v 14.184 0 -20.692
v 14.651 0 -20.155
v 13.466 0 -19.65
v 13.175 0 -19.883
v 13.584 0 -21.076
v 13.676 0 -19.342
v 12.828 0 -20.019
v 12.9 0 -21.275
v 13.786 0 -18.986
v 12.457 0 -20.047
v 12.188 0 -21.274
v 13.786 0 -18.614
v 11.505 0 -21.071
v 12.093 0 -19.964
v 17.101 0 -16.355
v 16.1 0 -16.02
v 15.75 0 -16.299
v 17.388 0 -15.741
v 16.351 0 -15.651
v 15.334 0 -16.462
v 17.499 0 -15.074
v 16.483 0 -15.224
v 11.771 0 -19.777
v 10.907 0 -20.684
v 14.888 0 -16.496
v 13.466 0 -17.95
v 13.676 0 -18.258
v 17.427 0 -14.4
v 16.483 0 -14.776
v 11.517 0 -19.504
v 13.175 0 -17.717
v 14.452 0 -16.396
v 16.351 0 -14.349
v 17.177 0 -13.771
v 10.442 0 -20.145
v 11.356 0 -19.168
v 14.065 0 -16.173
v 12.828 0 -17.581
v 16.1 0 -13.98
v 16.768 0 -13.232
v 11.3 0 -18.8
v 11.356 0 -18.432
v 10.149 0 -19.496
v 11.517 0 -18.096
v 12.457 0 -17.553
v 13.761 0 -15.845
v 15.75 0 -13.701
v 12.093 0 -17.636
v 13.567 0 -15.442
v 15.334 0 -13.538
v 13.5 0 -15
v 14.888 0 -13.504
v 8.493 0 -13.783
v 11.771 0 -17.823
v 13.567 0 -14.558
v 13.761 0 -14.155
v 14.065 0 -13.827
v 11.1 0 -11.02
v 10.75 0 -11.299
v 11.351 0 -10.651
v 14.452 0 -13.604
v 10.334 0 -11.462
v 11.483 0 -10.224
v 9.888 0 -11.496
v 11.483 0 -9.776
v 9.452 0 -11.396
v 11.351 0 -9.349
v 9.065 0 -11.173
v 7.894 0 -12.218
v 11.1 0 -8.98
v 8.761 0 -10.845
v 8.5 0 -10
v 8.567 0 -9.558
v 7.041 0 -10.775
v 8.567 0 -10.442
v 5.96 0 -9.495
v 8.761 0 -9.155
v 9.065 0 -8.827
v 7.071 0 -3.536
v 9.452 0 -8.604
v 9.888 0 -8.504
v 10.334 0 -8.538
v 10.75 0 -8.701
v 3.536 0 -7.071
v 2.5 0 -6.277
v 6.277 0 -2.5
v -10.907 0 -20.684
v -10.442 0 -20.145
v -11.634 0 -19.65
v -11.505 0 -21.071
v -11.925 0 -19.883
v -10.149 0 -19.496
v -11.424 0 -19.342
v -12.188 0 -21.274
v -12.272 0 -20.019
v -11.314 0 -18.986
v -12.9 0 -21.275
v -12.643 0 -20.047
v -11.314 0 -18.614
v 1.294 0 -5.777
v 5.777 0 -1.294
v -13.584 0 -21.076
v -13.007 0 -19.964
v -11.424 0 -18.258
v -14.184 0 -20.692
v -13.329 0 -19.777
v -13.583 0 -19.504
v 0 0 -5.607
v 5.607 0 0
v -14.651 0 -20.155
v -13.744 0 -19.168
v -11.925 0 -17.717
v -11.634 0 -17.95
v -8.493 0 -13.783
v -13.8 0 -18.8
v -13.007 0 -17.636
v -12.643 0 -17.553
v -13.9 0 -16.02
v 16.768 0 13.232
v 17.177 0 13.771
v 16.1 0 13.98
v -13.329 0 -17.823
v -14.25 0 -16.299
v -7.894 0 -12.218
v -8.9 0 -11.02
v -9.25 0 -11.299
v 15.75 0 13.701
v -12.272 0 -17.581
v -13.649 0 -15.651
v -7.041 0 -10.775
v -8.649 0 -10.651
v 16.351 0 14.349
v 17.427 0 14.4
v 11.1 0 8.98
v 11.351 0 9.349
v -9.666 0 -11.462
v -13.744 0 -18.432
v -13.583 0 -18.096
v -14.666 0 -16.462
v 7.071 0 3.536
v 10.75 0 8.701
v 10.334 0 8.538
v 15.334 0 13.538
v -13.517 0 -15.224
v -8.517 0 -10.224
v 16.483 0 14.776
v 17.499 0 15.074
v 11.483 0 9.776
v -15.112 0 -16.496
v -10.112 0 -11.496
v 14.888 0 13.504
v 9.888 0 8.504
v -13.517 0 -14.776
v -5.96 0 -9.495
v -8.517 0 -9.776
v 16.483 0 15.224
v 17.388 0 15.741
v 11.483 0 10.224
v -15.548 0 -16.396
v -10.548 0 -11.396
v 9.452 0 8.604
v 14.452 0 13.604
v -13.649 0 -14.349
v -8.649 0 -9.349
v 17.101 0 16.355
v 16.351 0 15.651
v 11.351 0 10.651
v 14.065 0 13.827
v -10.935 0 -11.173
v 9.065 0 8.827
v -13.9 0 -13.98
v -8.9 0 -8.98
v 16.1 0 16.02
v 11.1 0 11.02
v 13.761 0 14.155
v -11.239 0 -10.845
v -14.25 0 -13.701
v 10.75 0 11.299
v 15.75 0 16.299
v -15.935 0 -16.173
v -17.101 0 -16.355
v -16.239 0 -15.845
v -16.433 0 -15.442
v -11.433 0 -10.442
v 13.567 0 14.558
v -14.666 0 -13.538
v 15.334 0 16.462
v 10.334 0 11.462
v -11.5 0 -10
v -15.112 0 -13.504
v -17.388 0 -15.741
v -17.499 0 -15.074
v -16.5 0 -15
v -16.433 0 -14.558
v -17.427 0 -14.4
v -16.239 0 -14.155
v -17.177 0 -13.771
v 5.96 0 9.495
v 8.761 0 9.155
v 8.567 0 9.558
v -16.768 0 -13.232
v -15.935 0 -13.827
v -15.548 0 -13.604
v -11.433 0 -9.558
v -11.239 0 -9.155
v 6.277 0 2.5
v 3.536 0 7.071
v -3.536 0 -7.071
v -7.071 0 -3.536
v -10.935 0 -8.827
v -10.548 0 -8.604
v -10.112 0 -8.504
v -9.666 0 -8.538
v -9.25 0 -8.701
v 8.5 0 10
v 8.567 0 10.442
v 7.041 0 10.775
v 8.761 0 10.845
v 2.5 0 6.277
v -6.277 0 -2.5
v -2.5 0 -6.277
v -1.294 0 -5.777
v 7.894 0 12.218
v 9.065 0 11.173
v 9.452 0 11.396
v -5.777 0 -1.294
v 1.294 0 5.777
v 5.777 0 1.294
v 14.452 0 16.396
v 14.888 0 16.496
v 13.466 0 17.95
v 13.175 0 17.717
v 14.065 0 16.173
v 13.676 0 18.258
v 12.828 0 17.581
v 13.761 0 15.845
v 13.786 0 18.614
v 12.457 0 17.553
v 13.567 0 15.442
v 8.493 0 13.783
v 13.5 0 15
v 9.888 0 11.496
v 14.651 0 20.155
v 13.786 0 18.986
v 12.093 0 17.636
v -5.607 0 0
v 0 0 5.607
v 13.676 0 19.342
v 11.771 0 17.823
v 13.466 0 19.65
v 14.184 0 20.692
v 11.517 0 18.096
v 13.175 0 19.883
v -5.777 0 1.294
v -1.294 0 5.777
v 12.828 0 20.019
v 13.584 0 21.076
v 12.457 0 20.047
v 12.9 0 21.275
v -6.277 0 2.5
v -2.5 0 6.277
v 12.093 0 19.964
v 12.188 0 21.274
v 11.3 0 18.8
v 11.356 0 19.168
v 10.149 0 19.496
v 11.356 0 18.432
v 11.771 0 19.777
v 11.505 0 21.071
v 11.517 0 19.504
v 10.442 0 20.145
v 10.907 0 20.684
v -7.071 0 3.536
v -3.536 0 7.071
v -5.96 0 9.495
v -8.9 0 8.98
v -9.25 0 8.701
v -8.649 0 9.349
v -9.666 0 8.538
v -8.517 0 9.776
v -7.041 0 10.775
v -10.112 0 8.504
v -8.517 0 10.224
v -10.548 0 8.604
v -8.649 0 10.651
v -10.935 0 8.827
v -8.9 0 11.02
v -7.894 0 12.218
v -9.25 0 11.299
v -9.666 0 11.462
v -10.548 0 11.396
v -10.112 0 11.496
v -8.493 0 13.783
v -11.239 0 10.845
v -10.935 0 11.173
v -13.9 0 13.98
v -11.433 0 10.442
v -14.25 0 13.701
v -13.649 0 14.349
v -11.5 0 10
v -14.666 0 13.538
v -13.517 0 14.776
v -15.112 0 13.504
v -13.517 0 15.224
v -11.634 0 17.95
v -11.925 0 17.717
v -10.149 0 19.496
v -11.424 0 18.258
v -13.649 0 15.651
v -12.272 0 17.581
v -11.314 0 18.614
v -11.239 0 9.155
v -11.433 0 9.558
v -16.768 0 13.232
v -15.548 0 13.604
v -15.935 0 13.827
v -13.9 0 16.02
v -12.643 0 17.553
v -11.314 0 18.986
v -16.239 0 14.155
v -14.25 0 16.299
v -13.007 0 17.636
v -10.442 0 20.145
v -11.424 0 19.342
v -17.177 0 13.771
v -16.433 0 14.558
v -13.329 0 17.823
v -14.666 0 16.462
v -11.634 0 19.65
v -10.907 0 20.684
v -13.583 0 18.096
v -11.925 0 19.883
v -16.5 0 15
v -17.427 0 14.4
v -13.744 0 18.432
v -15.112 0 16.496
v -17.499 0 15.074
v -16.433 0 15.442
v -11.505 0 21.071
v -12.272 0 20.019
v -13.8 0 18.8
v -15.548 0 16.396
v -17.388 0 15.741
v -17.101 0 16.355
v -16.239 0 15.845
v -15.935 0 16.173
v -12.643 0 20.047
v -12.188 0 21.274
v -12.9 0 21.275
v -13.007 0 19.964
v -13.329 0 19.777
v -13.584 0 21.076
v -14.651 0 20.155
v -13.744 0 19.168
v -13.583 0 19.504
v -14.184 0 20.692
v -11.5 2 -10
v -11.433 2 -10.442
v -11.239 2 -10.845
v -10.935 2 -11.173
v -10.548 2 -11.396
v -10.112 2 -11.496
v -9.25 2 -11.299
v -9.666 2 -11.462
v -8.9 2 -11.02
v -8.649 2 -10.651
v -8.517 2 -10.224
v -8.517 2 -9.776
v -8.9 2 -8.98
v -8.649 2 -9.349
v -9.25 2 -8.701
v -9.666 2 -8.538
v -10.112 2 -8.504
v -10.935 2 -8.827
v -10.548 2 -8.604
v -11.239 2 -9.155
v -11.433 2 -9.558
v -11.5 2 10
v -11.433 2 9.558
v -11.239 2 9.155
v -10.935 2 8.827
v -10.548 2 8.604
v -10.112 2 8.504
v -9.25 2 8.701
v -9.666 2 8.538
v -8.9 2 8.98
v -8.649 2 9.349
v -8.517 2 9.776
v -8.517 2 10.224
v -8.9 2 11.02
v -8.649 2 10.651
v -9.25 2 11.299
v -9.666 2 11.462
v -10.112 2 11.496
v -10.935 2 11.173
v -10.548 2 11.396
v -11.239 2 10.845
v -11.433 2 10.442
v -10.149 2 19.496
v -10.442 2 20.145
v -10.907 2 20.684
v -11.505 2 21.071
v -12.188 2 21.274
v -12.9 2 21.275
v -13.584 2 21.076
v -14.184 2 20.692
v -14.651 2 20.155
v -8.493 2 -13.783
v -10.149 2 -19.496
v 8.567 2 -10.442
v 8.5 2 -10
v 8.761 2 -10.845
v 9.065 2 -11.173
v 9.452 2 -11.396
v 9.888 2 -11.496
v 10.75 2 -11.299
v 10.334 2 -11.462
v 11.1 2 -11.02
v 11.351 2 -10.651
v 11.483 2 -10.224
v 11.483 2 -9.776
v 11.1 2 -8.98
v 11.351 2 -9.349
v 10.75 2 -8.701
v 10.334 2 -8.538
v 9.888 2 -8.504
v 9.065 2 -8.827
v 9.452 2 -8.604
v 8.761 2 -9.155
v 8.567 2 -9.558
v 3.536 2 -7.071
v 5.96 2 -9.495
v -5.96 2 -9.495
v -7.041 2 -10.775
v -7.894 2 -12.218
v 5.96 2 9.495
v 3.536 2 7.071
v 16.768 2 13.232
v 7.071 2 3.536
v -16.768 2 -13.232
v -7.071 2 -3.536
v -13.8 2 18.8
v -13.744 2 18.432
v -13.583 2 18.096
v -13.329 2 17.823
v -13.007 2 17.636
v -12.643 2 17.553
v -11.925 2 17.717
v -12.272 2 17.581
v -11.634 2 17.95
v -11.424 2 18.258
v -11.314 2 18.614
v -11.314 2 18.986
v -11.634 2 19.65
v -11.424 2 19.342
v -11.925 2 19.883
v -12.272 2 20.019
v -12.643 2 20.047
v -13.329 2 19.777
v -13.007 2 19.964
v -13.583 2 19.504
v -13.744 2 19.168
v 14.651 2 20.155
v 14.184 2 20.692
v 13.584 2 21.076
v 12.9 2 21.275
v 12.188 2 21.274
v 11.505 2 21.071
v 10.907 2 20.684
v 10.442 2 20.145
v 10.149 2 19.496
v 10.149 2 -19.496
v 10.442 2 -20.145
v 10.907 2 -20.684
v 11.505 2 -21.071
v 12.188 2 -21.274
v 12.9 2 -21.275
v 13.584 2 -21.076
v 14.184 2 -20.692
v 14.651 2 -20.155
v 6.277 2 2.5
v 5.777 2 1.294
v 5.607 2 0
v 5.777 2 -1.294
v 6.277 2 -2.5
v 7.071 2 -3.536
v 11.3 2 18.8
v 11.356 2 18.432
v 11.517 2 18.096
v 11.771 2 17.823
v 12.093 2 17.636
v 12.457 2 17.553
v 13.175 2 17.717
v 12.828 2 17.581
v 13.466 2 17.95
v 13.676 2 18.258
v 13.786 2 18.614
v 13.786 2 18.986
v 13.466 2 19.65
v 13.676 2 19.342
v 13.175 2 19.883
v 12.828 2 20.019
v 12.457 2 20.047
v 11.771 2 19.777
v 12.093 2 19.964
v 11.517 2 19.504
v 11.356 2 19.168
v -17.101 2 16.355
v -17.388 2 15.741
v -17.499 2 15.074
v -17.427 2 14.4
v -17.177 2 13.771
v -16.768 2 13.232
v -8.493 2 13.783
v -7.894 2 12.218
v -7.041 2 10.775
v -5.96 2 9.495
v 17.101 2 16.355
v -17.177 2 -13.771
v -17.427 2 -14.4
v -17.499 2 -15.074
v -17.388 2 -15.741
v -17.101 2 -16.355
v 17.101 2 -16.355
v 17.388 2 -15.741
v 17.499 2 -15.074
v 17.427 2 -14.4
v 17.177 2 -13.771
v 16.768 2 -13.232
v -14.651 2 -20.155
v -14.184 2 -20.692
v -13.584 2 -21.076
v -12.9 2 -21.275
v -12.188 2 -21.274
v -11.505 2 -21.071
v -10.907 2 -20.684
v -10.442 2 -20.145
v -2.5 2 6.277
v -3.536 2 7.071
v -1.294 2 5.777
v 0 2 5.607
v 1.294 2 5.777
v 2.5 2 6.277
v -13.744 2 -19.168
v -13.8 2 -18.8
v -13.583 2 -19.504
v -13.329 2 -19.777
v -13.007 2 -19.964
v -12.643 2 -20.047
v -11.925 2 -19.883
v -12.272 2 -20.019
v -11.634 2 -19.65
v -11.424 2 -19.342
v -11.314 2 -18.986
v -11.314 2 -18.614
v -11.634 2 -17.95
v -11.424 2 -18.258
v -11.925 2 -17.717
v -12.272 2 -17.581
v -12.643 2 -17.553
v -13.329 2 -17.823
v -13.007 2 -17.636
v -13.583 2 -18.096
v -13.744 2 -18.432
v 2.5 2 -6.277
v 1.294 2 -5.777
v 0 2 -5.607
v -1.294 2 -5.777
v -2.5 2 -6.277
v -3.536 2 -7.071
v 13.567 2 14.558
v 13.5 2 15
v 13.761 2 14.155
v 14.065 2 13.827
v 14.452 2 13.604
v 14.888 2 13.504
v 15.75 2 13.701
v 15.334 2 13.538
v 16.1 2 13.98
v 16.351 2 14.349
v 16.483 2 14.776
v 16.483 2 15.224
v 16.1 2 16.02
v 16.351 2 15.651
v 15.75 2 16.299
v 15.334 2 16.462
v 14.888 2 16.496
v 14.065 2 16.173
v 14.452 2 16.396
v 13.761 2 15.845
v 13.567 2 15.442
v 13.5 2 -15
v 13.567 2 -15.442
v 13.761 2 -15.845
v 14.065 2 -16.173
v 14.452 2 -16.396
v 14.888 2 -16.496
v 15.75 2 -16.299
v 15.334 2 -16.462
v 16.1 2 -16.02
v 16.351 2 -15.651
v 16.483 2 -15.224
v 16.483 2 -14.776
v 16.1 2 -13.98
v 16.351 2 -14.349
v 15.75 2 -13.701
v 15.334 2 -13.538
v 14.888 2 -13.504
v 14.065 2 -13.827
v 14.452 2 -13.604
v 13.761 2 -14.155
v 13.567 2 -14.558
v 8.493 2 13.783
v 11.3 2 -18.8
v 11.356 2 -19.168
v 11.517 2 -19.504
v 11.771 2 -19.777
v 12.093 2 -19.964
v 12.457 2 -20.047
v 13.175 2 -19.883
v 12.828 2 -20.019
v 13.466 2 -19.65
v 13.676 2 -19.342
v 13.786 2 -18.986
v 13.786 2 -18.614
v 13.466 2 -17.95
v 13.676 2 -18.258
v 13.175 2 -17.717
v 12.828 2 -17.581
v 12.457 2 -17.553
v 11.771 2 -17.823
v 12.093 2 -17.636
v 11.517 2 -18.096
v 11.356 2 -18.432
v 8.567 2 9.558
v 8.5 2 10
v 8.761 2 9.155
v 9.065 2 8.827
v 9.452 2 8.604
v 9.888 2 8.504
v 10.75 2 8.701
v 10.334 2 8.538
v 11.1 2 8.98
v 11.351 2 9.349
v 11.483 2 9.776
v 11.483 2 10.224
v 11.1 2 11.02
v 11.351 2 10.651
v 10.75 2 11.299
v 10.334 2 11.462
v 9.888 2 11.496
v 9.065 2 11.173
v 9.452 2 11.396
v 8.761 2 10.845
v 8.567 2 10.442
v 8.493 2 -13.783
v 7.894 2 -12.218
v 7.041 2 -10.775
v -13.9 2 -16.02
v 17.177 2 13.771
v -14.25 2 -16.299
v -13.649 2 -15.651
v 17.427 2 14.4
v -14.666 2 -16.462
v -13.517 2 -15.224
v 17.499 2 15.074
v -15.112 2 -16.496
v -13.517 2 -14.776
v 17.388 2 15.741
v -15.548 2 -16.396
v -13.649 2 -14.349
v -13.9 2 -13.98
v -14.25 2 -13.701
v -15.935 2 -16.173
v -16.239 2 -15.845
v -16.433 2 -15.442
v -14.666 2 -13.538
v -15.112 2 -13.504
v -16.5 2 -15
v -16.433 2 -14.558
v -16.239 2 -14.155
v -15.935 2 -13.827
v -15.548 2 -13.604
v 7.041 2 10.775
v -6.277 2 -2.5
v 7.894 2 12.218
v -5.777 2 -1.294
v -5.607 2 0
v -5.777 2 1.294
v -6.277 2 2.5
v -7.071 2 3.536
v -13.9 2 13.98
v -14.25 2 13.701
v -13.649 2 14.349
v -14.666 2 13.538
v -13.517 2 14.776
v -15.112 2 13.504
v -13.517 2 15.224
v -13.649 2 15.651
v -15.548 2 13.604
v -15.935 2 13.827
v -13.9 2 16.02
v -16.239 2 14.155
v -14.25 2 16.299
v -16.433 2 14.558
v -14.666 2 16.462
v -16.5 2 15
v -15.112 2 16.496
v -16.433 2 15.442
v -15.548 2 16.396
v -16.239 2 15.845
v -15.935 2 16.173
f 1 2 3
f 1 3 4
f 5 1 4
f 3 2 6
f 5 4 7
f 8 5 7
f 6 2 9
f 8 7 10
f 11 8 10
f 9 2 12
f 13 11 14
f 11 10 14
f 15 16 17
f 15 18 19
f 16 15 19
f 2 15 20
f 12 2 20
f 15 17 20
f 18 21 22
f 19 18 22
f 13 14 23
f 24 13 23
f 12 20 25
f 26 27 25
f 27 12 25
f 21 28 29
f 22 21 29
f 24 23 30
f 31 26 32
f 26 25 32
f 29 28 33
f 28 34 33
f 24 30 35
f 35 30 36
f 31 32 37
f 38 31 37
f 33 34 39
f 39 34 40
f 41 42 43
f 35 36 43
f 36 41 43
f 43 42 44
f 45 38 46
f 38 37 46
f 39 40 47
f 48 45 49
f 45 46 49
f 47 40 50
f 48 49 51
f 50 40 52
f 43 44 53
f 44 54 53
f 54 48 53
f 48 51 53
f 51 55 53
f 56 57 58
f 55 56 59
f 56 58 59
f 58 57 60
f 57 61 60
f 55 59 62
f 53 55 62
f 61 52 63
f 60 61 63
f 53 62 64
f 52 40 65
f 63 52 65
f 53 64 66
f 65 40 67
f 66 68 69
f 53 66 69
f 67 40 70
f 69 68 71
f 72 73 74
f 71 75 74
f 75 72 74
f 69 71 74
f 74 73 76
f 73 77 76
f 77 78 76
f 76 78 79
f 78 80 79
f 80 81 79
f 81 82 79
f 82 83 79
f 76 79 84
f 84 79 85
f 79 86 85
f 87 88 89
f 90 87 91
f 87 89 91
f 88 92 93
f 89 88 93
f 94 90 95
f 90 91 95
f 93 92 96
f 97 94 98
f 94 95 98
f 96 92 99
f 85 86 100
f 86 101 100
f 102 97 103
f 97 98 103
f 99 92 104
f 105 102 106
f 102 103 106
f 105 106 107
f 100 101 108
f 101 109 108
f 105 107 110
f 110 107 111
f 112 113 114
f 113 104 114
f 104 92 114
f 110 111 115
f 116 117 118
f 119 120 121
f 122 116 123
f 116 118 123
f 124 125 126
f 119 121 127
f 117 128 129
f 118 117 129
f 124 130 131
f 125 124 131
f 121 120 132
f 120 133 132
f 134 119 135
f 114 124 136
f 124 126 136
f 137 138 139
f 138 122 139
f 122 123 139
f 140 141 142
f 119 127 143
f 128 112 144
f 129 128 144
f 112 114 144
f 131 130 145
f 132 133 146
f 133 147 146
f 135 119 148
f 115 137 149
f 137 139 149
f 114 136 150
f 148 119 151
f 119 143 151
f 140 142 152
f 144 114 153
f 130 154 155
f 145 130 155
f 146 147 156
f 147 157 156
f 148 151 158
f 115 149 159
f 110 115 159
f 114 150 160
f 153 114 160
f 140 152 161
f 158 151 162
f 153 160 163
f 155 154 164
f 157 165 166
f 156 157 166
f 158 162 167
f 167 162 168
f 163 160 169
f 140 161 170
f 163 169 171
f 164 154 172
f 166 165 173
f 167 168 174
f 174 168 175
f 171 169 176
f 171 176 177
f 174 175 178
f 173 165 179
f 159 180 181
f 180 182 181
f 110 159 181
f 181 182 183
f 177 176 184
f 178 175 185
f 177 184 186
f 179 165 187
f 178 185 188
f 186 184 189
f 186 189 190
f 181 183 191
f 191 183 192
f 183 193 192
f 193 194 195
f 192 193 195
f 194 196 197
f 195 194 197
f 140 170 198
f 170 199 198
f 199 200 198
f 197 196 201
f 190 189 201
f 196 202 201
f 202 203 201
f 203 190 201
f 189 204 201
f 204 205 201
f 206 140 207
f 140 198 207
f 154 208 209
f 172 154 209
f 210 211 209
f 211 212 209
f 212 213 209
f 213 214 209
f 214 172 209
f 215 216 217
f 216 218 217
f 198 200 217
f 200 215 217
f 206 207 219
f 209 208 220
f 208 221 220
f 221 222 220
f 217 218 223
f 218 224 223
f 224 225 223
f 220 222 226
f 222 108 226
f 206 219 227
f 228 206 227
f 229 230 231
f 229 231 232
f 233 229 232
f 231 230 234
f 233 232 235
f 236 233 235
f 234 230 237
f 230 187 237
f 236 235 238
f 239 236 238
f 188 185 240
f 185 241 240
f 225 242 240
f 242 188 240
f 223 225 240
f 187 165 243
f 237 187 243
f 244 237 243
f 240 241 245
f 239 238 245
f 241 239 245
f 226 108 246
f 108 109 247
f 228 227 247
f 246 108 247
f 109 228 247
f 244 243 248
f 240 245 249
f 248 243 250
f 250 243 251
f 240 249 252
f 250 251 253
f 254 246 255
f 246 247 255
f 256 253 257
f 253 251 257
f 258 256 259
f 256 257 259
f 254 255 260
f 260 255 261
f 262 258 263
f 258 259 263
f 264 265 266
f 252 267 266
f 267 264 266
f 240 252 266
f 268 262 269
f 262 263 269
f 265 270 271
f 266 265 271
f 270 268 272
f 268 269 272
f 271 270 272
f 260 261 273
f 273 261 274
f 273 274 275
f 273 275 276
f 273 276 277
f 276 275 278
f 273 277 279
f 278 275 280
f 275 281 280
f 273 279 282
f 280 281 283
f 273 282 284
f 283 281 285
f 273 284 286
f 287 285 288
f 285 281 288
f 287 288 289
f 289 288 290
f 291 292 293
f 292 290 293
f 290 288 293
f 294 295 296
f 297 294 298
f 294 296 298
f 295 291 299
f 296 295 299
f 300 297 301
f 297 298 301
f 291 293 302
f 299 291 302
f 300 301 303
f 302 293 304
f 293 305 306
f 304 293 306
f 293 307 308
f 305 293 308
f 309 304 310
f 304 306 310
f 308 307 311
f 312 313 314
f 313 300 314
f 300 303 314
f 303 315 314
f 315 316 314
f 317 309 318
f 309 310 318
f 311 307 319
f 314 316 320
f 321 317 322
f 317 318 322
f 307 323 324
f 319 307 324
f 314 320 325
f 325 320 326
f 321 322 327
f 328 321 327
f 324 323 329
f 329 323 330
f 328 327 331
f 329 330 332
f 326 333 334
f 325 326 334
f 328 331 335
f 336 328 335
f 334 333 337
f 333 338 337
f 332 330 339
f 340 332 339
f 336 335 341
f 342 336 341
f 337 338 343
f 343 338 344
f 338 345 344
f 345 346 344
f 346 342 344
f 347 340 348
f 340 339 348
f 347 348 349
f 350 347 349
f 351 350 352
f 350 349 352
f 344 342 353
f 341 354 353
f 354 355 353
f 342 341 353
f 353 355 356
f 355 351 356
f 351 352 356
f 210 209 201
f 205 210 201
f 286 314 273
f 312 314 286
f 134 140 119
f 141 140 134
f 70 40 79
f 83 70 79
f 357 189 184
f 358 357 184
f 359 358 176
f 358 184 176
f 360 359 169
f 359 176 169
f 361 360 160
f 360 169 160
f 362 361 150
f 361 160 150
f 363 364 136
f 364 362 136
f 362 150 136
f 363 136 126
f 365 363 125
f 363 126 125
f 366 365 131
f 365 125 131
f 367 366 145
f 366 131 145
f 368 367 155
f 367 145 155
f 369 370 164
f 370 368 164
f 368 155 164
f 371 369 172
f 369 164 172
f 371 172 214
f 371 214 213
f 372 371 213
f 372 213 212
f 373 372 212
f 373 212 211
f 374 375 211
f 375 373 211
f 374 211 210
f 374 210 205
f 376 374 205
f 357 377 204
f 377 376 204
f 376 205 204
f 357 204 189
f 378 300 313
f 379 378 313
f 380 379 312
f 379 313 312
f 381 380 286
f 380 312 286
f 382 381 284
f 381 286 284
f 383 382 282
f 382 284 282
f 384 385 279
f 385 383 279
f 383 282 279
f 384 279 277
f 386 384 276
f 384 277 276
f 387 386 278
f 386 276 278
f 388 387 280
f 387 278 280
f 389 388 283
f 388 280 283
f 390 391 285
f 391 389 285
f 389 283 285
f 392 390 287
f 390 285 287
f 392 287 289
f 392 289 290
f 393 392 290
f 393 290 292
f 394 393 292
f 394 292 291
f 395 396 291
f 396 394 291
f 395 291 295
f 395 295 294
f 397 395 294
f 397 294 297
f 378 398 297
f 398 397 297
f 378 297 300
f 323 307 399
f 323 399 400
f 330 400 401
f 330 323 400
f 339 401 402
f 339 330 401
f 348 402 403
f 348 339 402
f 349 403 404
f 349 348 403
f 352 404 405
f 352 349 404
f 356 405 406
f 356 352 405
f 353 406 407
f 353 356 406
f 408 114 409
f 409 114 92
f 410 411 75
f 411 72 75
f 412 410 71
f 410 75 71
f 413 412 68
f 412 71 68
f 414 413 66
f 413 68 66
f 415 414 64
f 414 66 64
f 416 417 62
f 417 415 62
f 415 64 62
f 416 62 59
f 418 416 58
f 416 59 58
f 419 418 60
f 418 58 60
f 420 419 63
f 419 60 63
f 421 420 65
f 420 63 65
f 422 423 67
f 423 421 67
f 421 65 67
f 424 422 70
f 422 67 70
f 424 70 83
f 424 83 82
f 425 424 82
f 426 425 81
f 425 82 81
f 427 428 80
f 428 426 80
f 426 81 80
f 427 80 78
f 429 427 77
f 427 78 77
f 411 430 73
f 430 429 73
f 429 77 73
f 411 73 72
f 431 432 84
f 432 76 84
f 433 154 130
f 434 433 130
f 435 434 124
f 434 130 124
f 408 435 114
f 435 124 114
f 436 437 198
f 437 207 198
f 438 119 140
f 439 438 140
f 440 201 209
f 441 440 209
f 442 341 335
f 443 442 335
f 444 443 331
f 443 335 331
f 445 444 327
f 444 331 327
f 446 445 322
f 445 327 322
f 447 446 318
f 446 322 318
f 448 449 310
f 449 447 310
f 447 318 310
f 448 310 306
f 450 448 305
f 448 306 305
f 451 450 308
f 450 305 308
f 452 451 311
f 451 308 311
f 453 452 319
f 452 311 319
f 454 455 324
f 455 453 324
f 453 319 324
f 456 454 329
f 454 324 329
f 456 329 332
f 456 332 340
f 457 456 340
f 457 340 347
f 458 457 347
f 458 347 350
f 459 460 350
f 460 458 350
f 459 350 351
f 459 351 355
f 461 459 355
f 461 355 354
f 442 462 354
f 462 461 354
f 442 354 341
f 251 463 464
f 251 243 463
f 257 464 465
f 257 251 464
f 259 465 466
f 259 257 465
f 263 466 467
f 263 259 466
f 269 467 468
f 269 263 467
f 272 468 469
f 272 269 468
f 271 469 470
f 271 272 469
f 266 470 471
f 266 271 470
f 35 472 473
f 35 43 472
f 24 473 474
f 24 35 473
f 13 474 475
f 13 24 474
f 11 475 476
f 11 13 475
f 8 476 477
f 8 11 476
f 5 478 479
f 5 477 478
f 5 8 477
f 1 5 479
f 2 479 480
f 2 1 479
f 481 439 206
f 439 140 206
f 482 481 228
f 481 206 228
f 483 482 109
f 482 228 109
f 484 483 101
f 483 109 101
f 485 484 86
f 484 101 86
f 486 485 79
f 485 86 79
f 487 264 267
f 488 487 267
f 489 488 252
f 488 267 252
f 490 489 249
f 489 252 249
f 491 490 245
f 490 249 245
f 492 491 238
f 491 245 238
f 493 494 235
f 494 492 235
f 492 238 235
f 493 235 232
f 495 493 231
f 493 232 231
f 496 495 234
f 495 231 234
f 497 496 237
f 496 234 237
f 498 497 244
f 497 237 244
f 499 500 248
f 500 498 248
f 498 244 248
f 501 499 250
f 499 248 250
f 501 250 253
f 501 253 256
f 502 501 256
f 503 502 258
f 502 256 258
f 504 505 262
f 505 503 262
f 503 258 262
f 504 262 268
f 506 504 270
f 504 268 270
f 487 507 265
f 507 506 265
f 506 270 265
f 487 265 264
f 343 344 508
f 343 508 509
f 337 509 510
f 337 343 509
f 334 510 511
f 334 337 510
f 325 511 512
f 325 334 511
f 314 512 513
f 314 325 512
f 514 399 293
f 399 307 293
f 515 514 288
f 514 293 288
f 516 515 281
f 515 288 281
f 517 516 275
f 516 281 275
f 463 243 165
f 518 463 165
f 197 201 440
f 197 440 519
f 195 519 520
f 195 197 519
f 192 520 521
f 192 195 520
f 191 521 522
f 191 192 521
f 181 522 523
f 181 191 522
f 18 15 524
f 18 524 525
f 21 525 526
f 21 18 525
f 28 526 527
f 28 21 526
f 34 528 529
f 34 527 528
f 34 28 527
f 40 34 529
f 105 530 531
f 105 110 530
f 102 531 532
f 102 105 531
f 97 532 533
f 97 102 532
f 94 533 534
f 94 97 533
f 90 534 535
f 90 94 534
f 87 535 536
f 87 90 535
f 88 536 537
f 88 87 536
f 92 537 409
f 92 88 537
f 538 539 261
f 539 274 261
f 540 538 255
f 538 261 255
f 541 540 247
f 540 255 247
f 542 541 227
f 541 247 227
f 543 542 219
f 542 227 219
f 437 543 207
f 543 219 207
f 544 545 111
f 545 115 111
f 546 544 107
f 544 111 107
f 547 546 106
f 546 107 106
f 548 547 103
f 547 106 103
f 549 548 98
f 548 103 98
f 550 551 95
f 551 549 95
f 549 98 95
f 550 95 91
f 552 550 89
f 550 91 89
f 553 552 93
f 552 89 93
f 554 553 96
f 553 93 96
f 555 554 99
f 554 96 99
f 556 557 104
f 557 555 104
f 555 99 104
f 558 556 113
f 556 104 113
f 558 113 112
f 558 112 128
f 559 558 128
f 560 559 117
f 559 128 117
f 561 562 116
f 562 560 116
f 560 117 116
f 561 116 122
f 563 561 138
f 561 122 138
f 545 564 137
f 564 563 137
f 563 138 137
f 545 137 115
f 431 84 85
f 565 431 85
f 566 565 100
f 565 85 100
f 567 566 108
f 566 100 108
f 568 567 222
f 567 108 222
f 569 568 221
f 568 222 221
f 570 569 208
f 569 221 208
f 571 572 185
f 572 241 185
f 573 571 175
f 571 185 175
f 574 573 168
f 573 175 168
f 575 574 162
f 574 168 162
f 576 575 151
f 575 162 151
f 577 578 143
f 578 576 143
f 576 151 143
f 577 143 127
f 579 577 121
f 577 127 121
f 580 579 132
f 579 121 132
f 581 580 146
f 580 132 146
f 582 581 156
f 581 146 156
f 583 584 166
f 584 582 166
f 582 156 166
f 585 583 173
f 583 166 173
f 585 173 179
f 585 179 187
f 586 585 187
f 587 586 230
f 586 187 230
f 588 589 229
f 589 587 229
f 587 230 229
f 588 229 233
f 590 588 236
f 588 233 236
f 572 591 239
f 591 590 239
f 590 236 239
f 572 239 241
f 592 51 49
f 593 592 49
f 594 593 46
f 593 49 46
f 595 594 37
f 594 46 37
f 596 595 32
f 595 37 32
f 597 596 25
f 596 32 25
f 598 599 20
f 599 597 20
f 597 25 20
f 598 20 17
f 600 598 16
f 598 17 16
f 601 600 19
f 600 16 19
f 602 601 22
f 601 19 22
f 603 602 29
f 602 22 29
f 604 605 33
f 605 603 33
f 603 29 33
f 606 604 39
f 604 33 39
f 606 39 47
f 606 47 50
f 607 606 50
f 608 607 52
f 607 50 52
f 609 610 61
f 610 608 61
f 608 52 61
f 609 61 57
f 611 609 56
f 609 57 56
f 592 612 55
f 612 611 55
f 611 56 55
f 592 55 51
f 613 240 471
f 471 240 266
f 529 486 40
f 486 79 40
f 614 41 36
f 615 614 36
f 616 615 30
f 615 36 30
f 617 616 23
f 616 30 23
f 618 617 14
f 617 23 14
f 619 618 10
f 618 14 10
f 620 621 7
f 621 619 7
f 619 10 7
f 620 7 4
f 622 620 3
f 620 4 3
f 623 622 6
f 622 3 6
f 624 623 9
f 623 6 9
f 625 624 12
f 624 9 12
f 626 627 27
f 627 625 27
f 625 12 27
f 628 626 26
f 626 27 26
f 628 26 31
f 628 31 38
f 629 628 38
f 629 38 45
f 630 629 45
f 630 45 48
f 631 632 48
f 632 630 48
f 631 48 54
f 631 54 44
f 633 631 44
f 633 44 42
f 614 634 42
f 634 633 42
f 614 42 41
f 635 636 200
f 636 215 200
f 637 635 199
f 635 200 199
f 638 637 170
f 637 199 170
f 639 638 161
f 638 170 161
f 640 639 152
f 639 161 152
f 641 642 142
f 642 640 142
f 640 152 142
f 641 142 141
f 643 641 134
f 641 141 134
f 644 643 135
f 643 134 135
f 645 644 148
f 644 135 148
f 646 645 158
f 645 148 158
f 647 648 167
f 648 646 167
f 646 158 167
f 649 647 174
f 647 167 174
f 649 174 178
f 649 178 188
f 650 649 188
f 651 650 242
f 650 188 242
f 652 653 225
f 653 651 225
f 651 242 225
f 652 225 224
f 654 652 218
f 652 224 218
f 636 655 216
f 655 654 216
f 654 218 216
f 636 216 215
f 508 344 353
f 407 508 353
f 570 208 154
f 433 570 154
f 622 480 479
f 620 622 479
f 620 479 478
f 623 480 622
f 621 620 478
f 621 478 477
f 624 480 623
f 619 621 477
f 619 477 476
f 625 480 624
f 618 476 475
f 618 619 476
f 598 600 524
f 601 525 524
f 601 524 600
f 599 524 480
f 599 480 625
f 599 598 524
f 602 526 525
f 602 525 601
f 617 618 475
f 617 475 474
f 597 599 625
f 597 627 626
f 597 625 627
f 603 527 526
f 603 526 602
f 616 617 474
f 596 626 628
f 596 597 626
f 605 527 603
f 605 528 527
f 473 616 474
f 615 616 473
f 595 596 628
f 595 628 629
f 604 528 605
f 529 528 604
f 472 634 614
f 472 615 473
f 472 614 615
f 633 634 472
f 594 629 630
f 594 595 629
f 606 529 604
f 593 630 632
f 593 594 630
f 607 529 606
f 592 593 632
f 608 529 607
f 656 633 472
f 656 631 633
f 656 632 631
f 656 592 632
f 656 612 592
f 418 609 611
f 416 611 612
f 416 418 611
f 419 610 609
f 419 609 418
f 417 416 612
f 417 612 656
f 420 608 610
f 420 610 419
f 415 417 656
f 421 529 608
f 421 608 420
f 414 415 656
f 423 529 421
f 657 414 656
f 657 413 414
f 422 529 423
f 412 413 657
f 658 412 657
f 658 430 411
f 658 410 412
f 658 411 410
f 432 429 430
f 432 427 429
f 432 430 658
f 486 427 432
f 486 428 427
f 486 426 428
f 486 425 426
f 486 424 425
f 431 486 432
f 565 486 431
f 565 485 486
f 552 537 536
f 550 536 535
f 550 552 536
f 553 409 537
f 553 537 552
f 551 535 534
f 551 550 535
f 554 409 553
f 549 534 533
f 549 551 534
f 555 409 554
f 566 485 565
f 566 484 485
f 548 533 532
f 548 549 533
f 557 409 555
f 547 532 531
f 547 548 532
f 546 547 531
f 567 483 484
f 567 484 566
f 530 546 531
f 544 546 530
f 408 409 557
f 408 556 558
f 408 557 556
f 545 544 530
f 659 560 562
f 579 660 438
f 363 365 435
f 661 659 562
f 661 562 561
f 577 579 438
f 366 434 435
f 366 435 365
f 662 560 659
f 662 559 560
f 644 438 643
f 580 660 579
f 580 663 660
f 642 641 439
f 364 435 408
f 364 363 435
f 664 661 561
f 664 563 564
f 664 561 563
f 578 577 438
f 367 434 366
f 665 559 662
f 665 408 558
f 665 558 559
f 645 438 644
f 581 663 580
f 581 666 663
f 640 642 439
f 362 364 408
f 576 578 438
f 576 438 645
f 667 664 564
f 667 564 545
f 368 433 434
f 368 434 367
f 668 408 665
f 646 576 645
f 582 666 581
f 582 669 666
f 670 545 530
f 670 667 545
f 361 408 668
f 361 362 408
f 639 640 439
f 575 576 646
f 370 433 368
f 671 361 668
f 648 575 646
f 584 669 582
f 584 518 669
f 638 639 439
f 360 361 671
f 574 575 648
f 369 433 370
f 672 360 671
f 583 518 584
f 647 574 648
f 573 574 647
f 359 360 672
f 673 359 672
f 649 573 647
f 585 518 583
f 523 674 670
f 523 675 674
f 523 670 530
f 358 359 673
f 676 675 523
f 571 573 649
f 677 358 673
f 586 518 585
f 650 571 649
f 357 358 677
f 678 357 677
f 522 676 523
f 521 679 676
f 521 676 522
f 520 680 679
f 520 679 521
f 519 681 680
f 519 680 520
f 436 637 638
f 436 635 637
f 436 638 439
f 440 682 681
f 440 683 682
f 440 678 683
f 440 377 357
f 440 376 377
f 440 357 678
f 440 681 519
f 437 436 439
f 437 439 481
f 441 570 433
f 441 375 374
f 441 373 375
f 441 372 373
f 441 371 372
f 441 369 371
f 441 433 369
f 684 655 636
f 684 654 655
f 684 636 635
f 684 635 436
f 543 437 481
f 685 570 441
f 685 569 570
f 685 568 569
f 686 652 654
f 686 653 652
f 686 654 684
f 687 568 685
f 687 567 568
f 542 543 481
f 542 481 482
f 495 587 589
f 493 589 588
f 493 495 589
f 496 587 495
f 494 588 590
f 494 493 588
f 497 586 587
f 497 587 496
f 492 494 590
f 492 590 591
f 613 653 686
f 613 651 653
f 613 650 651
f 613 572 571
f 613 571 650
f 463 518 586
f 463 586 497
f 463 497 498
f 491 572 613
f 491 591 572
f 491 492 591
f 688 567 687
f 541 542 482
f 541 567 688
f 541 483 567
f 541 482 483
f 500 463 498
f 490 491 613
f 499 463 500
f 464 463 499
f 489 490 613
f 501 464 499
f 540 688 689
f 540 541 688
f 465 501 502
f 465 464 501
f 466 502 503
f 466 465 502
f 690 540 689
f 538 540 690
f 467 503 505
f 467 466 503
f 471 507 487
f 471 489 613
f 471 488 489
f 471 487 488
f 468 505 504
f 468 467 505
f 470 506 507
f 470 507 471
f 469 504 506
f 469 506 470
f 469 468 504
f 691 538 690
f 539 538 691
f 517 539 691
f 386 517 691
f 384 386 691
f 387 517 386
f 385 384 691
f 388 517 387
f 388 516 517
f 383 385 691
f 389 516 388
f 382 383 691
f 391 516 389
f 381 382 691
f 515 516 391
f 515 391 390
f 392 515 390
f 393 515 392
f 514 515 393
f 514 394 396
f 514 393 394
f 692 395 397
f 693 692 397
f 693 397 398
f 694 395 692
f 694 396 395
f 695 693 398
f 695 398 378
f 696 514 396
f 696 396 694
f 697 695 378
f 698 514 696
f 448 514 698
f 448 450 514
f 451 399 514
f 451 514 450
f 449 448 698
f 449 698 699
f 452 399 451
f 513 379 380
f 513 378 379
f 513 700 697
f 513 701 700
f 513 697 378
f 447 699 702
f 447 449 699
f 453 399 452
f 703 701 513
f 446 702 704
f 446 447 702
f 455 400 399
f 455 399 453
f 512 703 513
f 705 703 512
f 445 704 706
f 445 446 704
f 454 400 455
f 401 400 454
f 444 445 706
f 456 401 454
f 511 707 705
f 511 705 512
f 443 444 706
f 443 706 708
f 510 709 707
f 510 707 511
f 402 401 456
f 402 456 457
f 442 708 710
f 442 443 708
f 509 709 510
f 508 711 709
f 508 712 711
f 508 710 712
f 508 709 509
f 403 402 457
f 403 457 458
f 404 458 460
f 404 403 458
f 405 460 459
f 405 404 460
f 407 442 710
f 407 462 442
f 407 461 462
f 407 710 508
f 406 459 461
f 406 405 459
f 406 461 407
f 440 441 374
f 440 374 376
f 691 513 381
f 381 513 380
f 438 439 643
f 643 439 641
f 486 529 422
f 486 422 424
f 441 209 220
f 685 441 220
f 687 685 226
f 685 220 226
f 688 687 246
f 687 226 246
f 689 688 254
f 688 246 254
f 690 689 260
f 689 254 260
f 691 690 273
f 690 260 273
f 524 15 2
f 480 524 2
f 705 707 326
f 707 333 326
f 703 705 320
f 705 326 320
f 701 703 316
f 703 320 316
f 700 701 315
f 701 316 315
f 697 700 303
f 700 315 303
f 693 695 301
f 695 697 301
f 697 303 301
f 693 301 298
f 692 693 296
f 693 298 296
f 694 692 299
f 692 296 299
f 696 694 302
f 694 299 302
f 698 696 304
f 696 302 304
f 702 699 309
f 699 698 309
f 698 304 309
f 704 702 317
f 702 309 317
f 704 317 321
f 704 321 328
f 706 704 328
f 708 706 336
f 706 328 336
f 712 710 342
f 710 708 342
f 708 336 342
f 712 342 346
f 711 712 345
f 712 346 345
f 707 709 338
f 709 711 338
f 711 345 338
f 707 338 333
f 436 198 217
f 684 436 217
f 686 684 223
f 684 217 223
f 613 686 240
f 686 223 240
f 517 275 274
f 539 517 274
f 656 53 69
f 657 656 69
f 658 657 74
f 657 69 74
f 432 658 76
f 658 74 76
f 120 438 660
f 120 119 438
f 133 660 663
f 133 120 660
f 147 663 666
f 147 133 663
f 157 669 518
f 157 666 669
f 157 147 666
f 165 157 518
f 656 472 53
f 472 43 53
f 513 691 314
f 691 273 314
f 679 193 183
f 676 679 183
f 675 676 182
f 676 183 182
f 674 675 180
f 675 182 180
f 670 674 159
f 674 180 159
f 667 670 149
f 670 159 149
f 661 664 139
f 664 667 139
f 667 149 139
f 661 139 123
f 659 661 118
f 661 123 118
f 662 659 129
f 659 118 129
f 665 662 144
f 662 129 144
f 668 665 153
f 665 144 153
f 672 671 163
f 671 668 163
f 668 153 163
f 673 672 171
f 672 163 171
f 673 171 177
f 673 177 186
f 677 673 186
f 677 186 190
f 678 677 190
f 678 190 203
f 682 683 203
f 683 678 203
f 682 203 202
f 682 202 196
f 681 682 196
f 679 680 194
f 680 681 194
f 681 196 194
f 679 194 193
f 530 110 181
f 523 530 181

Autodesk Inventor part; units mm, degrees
ref_plane "YZ Plane" through (0, 0, 0) normal (1, 0, 0) x (0, 1, 0)
ref_plane "XZ Plane" through (0, 0, 0) normal (0, 1, 0) x (-1, 0, 0)
ref_plane "XY Plane" through (0, 0, 0) normal (0, 0, 1) x (1, 0, 0)
sketch "Эскиз1" plane through (0, 0, 0) normal (0, 1, 0) x (-1, 0, 0)
  circle A0 centre (12.55, 18.8) radius 1.25
  circle A1 centre (-12.55, 18.8) radius 1.25
  circle A2 centre (-12.55, -18.8) radius 1.25
  circle A3 centre (12.55, -18.8) radius 1.25
  circle A4 centre (15, -15) radius 1.5
  circle A5 centre (15, 15) radius 1.5
  circle A6 centre (10, 10) radius 1.5
  circle A7 centre (10, -10) radius 1.5
  circle A8 centre (-10, 10) radius 1.5
  circle A9 centre (-10, -10) radius 1.5
  circle A10 centre (-15, -15) radius 1.5
  circle A11 centre (-15, 15) radius 1.5
  arc A12 (16.7678, 13.2322) -> (17.1011, 16.3547) centre (15, 15) ccw
  arc A13 (-16.7678, -13.2322) -> (-17.1011, -16.3547) centre (-15, -15) ccw
  arc A14 (17.1011, -16.3547) -> (16.7678, -13.2322) centre (15, -15) ccw
  arc A15 (-17.1011, 16.3547) -> (-16.7678, 13.2322) centre (-15, 15) ccw
  line L0 (16.7678, -13.2322) -> (7.0711, -3.5355)
  line L1 (-3.5355, 7.0711) -> (-5.9595, 9.4951)
  line L2 (-5.9595, -9.4951) -> (-3.5355, -7.0711)
  line L3 (7.0711, 3.5355) -> (16.7678, 13.2322)
  line L4 (5.9595, 9.4951) -> (3.5355, 7.0711)
  line L5 (-7.0711, -3.5355) -> (-16.7678, -13.2322)
  line L6 (-16.7678, 13.2322) -> (-7.0711, 3.5355)
  line L7 (3.5355, -7.0711) -> (5.9595, -9.4951)
  line L8 (10.1488, 19.4958) -> (8.4933, 13.7829)
  arc A16 (14.6511, 20.1547) -> (10.1488, 19.4958) centre (12.55, 18.8) ccw
  line L9 (10, -10) -> (12.55, -18.8) construction
  line L10 (8.4933, -13.7829) -> (10.1488, -19.4958)
  arc A17 (10.1488, -19.4958) -> (14.6511, -20.1547) centre (12.55, -18.8) ccw
  line L11 (-10.1488, -19.4958) -> (-8.4933, -13.7829)
  arc A18 (-14.6511, -20.1547) -> (-10.1488, -19.4958) centre (-12.55, -18.8) ccw
  line L12 (-8.4933, 13.7829) -> (-10.1488, 19.4958)
  arc A19 (-10.1488, 19.4958) -> (-14.6511, 20.1547) centre (-12.55, 18.8) ccw
  line L13 (10, 10) -> (10.4175, 11.4407) construction
  line L14 (12.2021, 17.5994) -> (12.55, 18.8) construction
  line L15 (12.55, 18.8) -> (15, 15) construction
  line L16 (17.1011, 16.3547) -> (14.6511, 20.1547)
  arc A20 (14.6511, 20.1547) -> (10.1488, 19.4958) centre (12.55, 18.8) ccw
  arc A21 (16.7678, 13.2322) -> (17.1011, 16.3547) centre (15, 15) ccw
  line L17 (15, -15) -> (12.55, -18.8) construction
  line L18 (11.8055, -15.3411) -> (11.6276, -15.617)
  line L19 (14.6511, -20.1547) -> (17.1011, -16.3547)
  arc A22 (17.1011, -16.3547) -> (16.7678, -13.2322) centre (15, -15) ccw
  arc A23 (10.1488, -19.4958) -> (14.6511, -20.1547) centre (12.55, -18.8) ccw
  line L20 (-12.55, -18.8) -> (-15, -15) construction
  line L21 (-17.1011, -16.3547) -> (-14.6511, -20.1547)
  arc A24 (-14.6511, -20.1547) -> (-10.1488, -19.4958) centre (-12.55, -18.8) ccw
  arc A25 (-16.7678, -13.2322) -> (-17.1011, -16.3547) centre (-15, -15) ccw
  line L22 (-15, 15) -> (-12.55, 18.8) construction
  line L23 (-14.6511, 20.1547) -> (-17.1011, 16.3547)
  arc A26 (-17.1011, 16.3547) -> (-16.7678, 13.2322) centre (-15, 15) ccw
  arc A27 (-10.1488, 19.4958) -> (-14.6511, 20.1547) centre (-12.55, 18.8) ccw
  arc A28 (7.0711, 3.5355) -> (7.0711, -3.5355) centre (10.6066, 0) ccw
  arc A29 (-3.5355, 7.0711) -> (3.5355, 7.0711) centre (0, 10.6066) ccw
  arc A30 (3.5355, -7.0711) -> (-3.5355, -7.0711) centre (0, -10.6066) ccw
  arc A31 (-7.0711, -3.5355) -> (-7.0711, 3.5355) centre (-10.6066, 0) ccw
  arc A32 (5.9595, 9.4951) -> (8.4933, 13.7829) centre (-1.1115, 16.5661) ccw
  arc A33 (-8.4933, 13.7829) -> (-5.9595, 9.4951) centre (1.1115, 16.5661) ccw
  arc A34 (-5.9595, -9.4951) -> (-8.4933, -13.7829) centre (1.1115, -16.5661) ccw
  arc A35 (8.4933, -13.7829) -> (5.9595, -9.4951) centre (-1.1115, -16.5661) ccw
  point P0 (0, 0)
  point P1 (0, 0)
  point P2 (0, 0)
  point P3 (11.275, 14.4)
  point P4 (11.275, -14.4)
  point P5 (-11.275, -14.4)
  point P6 (-11.275, 14.4)
  point P7 (13.775, 16.9)
  point P8 (13.775, -16.9)
  point P9 (-13.775, -16.9)
  point P10 (-13.775, 16.9)
  dimension "d12" = 3
  dimension "d7" = 2.5
  dimension "d8" = 2.5
  dimension "d9" = 2.5
  dimension "d10" = 3
  dimension "d11" = 3
  dimension "d13" = 3
  dimension "d14" = 3
  dimension "d15" = 3
  dimension "d16" = 3
  dimension "d17" = 3
  dimension "d21" = 5
  dimension "d24" = 5
  dimension "d25" = 5
  dimension "d26" = 5
  dimension "d27" = 5
  dimension "d28" = 5
  dimension "d29" = 10
extrude "Выдавливание1" add sketch "Эскиз1" along normal blind 2
properties part number "2030fermto"
